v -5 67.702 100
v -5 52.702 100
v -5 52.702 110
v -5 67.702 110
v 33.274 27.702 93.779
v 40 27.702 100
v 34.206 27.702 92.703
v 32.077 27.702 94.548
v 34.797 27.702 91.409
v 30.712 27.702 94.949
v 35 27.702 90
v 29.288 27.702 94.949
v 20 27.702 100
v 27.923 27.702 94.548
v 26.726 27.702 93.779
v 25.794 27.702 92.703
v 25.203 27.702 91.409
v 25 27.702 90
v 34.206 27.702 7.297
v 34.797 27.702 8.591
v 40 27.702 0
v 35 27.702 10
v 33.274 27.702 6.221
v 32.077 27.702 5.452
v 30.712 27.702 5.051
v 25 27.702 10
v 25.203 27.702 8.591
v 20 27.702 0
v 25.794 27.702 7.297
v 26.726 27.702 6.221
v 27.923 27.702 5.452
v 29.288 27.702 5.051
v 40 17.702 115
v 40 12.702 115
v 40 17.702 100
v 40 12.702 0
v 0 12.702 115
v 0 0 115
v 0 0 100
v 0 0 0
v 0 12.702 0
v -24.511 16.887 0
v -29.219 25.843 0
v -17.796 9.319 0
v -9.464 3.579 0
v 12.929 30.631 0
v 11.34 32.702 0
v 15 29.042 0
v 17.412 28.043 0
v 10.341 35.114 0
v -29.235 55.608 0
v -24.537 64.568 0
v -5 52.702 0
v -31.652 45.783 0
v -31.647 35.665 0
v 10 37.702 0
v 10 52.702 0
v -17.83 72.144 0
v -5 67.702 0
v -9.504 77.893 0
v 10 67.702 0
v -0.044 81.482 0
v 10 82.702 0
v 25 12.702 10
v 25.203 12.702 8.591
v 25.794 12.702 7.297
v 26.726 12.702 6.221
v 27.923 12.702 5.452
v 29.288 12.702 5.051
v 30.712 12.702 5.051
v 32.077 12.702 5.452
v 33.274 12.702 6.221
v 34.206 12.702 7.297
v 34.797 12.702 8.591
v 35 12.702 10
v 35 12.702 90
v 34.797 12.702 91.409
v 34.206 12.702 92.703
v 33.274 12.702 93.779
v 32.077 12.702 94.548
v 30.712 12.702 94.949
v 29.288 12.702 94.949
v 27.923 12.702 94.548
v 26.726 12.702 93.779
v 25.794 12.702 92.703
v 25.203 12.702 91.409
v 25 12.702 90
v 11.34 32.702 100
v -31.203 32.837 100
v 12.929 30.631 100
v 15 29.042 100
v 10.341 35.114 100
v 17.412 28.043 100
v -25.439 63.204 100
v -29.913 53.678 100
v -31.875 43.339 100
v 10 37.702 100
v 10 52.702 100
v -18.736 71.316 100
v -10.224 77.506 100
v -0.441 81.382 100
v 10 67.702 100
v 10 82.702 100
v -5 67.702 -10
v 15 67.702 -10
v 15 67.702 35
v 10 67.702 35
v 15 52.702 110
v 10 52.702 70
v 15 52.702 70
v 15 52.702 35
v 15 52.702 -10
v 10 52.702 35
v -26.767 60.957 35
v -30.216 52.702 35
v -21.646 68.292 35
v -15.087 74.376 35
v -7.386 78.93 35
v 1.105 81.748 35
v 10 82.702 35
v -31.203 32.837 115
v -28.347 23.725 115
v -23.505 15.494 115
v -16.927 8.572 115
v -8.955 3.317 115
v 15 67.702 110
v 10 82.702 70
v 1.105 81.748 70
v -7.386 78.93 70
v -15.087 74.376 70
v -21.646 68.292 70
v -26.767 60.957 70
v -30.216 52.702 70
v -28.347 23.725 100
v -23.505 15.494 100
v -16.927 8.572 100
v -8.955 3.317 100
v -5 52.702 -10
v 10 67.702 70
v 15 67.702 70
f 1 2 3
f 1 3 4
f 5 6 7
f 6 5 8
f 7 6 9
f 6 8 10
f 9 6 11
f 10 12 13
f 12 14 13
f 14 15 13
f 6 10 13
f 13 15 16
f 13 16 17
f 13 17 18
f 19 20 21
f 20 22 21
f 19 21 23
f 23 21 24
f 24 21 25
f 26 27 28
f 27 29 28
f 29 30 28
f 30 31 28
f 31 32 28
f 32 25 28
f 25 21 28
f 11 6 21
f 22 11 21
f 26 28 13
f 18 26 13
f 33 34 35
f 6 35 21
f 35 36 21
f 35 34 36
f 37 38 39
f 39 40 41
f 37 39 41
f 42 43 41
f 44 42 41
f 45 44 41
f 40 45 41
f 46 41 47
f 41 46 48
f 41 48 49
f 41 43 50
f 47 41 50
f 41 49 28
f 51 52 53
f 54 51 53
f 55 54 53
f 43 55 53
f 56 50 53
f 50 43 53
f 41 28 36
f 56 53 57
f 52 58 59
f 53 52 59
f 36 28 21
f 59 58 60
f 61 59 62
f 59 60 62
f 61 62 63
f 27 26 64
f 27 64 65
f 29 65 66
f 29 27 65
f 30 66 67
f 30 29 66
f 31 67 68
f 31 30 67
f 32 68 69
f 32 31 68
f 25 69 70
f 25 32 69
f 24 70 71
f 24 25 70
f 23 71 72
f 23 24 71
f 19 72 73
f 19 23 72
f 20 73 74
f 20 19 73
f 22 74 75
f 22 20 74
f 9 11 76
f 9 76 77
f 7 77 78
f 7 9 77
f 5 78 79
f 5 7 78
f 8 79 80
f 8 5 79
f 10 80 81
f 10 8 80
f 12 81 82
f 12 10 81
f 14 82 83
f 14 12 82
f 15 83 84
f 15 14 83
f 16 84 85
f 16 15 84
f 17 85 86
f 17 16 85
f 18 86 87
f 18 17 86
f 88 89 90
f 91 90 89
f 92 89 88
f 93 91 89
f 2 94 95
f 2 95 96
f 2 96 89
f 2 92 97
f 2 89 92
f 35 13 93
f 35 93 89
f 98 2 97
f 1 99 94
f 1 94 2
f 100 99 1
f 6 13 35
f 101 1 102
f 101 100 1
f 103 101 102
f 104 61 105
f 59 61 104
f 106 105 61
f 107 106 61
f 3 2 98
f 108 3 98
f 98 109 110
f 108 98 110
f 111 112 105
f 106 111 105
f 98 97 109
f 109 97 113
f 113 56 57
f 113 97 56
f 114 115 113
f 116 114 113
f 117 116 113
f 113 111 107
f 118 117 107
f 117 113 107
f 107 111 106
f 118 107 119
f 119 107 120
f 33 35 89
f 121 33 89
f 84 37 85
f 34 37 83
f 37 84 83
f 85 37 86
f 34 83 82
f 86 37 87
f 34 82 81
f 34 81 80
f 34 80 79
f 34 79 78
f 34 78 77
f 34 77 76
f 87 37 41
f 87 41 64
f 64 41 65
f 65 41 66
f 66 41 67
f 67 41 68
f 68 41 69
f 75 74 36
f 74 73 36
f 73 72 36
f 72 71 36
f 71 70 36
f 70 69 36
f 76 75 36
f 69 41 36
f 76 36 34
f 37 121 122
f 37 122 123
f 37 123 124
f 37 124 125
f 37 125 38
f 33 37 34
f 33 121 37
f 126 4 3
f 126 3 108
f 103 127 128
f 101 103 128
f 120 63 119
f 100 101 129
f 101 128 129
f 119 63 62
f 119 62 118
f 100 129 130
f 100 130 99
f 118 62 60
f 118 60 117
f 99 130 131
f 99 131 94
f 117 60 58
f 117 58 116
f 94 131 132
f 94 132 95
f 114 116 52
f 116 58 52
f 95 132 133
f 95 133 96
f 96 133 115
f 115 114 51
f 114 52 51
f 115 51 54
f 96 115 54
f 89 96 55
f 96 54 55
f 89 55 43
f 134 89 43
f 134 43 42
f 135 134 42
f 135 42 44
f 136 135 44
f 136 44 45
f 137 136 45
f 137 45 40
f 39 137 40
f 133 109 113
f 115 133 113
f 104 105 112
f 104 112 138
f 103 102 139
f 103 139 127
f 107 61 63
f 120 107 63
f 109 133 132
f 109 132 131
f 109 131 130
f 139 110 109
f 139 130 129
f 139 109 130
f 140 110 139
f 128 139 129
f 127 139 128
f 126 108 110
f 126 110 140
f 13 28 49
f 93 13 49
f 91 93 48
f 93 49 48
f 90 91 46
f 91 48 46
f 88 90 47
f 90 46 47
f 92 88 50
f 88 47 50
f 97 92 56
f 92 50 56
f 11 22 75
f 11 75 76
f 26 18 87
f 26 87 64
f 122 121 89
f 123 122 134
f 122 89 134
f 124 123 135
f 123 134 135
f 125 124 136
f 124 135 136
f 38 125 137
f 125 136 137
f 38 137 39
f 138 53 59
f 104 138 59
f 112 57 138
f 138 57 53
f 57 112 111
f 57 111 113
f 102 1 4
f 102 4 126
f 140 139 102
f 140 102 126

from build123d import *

# Parameters (mm, degrees)
BOSS_EXTRUDE1_DEPTH = 100
SKETCH2_W           = 35
SKETCH2_H           = 30
CUT_EXTRUDE1_DEPTH  = 139.001578957
SKETCH3_W           = 20
SKETCH3_H           = 15
BOSS_EXTRUDE2_DEPTH = 10
SKETCH4_W           = 20
SKETCH4_H           = 15
BOSS_EXTRUDE3_DEPTH = 10
BOSS_EXTRUDE4_DEPTH = 15
CUT_EXTRUDE2_DEPTH  = 134.603892159


with BuildPart() as part:
    # Sketch1 → Boss-Extrude1 (new body)
    with BuildSketch(Plane.XY):
        with BuildLine():
            Line((0, 0), (0, 12.701945525))
            Line((0, 12.701945525), (40, 12.701945525))
            Line((40, 12.701945525), (40, 27.701945525))
            Line((40, 27.701945525), (20, 27.701945525))
            ThreePointArc((20, 27.701945525), (12.928932188, 30.630877713), (10, 37.701945525))
            Line((10, 37.701945525), (10, 52.701945525))
            Line((10, 52.701945525), (15, 52.701945525))
            Line((15, 52.701945525), (15, 67.701945525))
            Line((15, 67.701945525), (10, 67.701945525))
            Line((10, 67.701945525), (10, 82.701945525))
            ThreePointArc((10, 82.701945525), (-31.652166191, 45.782811211), (0, 0))
        make_face()
    extrude(amount=BOSS_EXTRUDE1_DEPTH)

    # Sketch2 → Cut-Extrude1 (cut, through all)
    with BuildSketch(Plane(origin=(15, 0, 0), x_dir=(0, 0, -1), z_dir=(1, 0, 0))):
        with Locations((-52.5, 67.701945525)):
            Rectangle(SKETCH2_W, SKETCH2_H)
    extrude(amount=-CUT_EXTRUDE1_DEPTH, mode=Mode.SUBTRACT)

    # Sketch3 → Boss-Extrude2 (add)
    with BuildSketch(Plane.XY.offset(100)):
        with Locations((5, 60.201945525)):
            Rectangle(SKETCH3_W, SKETCH3_H)
    extrude(amount=BOSS_EXTRUDE2_DEPTH)

    # Sketch4 → Boss-Extrude3 (add)
    with BuildSketch(Plane(origin=(0, 0, 0), x_dir=(-1, 0, 0), z_dir=(0, 0, -1))):
        with Locations((-5, 60.201945525)):
            Rectangle(SKETCH4_W, SKETCH4_H)
    extrude(amount=BOSS_EXTRUDE3_DEPTH)

    # Sketch5 → Boss-Extrude4 (add)
    with BuildSketch(Plane.XY.offset(100)):
        with BuildLine():
            Line((40, 17.701945525), (-31.20321015, 32.836655055))
            ThreePointArc((-31.20321015, 32.836655055), (-20.413872841, 11.845443896), (0, 0))
            Line((0, 0), (0, 12.701945525))
            Line((0, 12.701945525), (40, 12.701945525))
            Line((40, 12.701945525), (40, 17.701945525))
        make_face()
    extrude(amount=BOSS_EXTRUDE4_DEPTH)

    # Sketch6 → Cut-Extrude2 (cut, through all)
    with BuildSketch(Plane(origin=(0, 27.701945525, 0), x_dir=(1, 0, 0), z_dir=(0, 1, 0))):
        with BuildLine():
            Line((35, -10), (35, -90))
            ThreePointArc((35, -90), (30, -95), (25, -90))
            Line((25, -90), (25, -10))
            ThreePointArc((25, -10), (30, -5), (35, -10))
        make_face()
    extrude(amount=-CUT_EXTRUDE2_DEPTH, mode=Mode.SUBTRACT)


solid = part.part
